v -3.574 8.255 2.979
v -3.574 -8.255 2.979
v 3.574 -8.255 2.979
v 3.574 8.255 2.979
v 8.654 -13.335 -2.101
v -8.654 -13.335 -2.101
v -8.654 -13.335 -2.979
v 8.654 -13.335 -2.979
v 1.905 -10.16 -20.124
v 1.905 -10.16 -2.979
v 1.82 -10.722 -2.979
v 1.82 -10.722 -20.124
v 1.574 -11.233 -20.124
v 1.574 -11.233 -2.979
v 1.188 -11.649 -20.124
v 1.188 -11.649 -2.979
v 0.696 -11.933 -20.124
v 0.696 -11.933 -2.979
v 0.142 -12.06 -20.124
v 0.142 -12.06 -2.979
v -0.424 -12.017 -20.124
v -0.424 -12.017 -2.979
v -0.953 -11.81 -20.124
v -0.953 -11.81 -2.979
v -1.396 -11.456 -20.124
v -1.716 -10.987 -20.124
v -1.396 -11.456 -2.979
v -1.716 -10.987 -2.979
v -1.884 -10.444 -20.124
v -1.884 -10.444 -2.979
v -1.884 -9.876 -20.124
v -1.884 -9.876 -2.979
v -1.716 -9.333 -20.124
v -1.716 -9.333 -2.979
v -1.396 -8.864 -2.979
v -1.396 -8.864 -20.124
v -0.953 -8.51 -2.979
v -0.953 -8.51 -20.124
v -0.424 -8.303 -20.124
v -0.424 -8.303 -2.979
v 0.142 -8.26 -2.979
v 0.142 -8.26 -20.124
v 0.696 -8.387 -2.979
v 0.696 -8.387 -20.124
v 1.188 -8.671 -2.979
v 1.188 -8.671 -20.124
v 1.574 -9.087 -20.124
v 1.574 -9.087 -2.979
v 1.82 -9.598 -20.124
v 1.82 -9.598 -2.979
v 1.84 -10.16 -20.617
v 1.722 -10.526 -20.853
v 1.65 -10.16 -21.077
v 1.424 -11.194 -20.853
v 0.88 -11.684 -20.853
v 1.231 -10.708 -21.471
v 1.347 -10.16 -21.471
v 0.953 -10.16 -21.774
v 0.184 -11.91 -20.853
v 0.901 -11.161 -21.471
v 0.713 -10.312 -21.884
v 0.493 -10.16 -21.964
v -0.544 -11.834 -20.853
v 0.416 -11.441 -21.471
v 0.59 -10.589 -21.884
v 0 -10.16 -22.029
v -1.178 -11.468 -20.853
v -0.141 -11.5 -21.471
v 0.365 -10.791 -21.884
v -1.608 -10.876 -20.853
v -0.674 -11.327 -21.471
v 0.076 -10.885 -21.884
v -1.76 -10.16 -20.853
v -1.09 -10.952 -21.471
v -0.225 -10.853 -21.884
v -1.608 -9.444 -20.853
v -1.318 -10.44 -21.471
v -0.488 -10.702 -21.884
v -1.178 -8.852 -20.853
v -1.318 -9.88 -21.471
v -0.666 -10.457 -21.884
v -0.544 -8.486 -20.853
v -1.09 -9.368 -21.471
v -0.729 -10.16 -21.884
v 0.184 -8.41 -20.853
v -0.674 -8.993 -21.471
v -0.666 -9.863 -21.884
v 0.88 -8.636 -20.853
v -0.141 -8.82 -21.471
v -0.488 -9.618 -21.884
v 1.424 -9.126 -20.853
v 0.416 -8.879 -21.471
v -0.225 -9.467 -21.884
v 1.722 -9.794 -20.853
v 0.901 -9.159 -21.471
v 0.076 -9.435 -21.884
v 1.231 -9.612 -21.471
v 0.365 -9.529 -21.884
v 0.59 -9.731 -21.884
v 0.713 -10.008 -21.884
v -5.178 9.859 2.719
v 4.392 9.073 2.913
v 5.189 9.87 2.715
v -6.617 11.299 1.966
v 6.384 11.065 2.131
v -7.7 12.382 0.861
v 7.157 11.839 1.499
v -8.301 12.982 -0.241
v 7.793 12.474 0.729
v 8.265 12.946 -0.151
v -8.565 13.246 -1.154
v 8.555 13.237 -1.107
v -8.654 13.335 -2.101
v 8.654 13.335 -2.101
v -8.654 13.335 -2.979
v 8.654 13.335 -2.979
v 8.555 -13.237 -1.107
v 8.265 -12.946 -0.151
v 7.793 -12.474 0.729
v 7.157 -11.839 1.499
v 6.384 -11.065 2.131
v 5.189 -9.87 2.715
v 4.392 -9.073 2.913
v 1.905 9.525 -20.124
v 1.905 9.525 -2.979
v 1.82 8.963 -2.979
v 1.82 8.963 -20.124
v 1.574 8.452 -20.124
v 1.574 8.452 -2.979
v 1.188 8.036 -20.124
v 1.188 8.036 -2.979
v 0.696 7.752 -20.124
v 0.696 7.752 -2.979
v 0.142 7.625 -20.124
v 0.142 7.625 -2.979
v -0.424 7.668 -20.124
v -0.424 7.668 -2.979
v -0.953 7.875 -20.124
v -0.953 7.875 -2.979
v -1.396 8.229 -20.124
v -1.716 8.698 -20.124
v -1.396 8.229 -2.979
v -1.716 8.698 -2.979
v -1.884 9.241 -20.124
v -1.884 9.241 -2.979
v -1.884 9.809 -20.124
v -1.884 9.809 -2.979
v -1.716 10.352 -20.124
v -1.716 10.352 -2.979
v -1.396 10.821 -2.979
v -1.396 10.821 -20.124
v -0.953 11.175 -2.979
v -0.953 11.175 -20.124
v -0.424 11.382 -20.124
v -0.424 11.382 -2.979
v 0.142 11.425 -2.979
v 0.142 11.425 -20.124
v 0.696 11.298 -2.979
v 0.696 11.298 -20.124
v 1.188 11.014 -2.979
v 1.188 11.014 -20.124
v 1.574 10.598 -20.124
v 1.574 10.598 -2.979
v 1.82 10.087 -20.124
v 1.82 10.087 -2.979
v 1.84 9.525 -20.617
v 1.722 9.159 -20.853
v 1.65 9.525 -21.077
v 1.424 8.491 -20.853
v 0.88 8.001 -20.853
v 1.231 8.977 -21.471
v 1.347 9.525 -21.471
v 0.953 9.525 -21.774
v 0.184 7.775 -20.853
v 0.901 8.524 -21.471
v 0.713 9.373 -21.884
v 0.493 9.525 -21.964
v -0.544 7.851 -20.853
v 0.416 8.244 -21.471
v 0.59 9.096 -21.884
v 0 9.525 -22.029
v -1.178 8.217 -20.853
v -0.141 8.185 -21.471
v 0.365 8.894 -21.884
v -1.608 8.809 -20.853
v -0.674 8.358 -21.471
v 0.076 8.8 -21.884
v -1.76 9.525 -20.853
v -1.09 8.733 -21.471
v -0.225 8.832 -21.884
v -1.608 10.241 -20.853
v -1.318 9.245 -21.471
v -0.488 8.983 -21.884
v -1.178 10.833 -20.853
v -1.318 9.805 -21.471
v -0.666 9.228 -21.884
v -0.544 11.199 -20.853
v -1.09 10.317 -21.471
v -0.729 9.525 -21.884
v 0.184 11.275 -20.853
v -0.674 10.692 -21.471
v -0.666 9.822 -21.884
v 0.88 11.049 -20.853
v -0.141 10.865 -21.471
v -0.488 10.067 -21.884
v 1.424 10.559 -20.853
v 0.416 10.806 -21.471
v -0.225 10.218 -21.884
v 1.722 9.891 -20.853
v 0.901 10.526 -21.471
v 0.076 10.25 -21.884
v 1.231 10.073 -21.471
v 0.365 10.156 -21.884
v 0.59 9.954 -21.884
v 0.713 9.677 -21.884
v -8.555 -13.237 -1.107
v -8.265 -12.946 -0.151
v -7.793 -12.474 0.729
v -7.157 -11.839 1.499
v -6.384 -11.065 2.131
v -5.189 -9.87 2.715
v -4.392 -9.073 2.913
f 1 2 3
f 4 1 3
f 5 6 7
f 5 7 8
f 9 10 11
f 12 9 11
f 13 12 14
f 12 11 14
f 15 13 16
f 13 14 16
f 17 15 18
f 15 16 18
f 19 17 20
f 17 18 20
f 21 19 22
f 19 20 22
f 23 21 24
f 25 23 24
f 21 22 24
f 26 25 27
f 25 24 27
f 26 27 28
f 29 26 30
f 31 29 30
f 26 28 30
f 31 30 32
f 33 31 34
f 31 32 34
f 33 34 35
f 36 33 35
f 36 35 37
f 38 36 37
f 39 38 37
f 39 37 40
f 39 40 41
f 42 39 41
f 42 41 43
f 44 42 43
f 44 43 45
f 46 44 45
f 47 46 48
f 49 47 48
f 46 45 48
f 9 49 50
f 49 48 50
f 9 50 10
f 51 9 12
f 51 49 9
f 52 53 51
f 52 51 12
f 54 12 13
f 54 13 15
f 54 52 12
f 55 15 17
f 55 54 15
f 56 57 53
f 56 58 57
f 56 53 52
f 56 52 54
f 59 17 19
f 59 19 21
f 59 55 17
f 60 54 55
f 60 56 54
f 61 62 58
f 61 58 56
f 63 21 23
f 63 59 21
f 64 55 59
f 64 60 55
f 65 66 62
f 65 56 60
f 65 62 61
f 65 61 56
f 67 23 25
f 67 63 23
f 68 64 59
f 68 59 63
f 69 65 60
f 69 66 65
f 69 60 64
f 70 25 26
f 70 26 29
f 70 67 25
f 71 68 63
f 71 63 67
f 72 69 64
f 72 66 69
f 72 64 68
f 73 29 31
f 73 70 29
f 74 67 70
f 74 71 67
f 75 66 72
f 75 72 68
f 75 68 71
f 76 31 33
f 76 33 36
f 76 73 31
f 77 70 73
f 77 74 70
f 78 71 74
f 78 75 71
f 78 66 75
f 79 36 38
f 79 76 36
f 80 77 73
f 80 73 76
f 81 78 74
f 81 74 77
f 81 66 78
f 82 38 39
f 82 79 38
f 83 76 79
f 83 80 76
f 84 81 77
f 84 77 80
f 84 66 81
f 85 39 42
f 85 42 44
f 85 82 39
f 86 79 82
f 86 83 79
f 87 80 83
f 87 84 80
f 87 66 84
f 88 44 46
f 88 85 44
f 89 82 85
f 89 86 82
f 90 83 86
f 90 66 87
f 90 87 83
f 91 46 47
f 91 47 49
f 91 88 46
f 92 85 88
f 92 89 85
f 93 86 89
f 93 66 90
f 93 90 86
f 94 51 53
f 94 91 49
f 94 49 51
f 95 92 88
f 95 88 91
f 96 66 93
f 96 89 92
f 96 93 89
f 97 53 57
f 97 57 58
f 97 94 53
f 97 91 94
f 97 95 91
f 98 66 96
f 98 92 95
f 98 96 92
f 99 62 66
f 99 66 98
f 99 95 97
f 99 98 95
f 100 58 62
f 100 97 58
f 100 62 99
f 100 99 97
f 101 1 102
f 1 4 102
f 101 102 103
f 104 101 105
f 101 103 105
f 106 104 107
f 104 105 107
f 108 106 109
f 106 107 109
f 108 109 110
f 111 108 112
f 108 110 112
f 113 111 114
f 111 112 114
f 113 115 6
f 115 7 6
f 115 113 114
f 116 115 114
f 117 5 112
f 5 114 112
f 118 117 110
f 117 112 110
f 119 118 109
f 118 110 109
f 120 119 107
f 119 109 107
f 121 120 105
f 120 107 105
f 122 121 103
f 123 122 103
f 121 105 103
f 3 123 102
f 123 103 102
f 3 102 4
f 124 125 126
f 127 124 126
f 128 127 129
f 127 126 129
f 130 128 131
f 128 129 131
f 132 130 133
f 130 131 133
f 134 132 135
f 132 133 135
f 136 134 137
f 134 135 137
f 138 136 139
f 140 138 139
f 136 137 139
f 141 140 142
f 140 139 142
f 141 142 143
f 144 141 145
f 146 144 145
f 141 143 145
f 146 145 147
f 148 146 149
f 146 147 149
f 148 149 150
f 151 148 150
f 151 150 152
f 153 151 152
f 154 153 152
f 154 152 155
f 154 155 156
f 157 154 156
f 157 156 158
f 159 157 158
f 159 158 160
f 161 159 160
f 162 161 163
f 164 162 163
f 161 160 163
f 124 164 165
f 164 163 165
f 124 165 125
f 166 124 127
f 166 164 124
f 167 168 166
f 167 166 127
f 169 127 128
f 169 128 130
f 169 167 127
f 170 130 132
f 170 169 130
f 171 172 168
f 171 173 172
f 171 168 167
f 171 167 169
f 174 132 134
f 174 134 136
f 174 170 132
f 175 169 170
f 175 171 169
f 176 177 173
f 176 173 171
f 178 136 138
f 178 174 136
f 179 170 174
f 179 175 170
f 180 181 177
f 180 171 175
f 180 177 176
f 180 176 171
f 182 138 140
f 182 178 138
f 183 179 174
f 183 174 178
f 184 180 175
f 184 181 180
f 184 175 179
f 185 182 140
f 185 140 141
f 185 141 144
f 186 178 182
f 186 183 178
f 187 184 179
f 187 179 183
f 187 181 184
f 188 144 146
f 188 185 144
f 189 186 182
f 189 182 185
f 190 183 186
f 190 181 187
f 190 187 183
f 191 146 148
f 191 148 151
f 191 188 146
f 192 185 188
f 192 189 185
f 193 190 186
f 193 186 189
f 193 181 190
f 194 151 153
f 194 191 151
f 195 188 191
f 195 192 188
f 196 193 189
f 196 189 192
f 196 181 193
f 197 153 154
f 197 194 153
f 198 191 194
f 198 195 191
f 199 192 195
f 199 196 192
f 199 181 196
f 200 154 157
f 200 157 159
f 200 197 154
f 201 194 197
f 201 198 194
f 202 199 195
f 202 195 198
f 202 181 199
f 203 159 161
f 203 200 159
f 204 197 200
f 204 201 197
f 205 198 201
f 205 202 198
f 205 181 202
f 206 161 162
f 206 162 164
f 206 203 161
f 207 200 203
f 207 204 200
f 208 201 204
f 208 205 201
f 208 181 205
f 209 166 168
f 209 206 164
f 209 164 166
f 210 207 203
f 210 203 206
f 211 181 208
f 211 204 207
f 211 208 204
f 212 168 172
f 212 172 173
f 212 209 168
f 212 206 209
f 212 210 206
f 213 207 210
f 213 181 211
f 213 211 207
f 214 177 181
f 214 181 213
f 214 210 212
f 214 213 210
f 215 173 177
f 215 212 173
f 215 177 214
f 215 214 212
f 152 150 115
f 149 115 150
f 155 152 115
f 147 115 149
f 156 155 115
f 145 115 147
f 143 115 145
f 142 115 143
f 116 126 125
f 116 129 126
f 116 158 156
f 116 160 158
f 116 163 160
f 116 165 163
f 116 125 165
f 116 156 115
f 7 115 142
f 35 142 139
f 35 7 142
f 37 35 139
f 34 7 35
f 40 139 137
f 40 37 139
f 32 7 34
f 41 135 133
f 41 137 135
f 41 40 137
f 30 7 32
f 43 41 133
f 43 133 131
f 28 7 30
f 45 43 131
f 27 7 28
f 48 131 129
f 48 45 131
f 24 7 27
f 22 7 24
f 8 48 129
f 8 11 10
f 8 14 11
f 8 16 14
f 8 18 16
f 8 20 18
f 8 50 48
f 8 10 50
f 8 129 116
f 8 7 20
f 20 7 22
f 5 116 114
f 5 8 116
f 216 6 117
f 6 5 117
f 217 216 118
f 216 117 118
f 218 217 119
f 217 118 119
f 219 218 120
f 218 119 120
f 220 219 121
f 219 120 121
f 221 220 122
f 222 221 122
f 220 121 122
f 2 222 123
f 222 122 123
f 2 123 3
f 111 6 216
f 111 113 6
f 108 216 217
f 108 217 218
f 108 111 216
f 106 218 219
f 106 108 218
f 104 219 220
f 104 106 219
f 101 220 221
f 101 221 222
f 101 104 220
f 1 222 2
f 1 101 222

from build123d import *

# Parameters (mm, degrees)
F0_W     = 17.30713
F0_H     = 5.958192
F1_DEPTH = 13.335
F2_DEPTH = 13.335
F3_R     = 5.08
F4_R     = 1.905
F5_DEPTH = 19.05
F6_R     = 1.905


with BuildPart() as f1:
    # F0 (on Front) → F1 (new body)
    with BuildSketch(Plane.XZ):
        Rectangle(F0_W, F0_H)
    extrude(amount=F1_DEPTH)

    # F0 (on Front) → F2 (join)
    with BuildSketch(Plane.XZ):
        Rectangle(F0_W, F0_H)
    extrude(amount=-F2_DEPTH)

    # F3
    f3_edges = [f1.edges().sort_by_distance(p)[0] for p in [
        (8.653565, 0, 2.979096),
        (0, 13.335, 2.979096),
        (-8.653565, 0, 2.979096),
        (0, -13.335, 2.979096),
    ]]
    fillet(f3_edges, radius=F3_R)

    # F4 (on face) → F5 (join)
    with BuildSketch(Plane(origin=(0, 0, -2.979096), x_dir=(1, 0, 0), z_dir=(0, 0, -1))):
        with Locations((0, 10.16)):
            Circle(F4_R)
        with Locations((0, -9.525)):
            Circle(F4_R)
    extrude(amount=F5_DEPTH)

    # F6
    f6_edges = [f1.edges().sort_by_distance(p)[0] for p in [
        (-1.905, -10.16, -22.029096),
        (-1.905, 9.525, -22.029096),
    ]]
    fillet(f6_edges, radius=F6_R)


solid = f1.part
